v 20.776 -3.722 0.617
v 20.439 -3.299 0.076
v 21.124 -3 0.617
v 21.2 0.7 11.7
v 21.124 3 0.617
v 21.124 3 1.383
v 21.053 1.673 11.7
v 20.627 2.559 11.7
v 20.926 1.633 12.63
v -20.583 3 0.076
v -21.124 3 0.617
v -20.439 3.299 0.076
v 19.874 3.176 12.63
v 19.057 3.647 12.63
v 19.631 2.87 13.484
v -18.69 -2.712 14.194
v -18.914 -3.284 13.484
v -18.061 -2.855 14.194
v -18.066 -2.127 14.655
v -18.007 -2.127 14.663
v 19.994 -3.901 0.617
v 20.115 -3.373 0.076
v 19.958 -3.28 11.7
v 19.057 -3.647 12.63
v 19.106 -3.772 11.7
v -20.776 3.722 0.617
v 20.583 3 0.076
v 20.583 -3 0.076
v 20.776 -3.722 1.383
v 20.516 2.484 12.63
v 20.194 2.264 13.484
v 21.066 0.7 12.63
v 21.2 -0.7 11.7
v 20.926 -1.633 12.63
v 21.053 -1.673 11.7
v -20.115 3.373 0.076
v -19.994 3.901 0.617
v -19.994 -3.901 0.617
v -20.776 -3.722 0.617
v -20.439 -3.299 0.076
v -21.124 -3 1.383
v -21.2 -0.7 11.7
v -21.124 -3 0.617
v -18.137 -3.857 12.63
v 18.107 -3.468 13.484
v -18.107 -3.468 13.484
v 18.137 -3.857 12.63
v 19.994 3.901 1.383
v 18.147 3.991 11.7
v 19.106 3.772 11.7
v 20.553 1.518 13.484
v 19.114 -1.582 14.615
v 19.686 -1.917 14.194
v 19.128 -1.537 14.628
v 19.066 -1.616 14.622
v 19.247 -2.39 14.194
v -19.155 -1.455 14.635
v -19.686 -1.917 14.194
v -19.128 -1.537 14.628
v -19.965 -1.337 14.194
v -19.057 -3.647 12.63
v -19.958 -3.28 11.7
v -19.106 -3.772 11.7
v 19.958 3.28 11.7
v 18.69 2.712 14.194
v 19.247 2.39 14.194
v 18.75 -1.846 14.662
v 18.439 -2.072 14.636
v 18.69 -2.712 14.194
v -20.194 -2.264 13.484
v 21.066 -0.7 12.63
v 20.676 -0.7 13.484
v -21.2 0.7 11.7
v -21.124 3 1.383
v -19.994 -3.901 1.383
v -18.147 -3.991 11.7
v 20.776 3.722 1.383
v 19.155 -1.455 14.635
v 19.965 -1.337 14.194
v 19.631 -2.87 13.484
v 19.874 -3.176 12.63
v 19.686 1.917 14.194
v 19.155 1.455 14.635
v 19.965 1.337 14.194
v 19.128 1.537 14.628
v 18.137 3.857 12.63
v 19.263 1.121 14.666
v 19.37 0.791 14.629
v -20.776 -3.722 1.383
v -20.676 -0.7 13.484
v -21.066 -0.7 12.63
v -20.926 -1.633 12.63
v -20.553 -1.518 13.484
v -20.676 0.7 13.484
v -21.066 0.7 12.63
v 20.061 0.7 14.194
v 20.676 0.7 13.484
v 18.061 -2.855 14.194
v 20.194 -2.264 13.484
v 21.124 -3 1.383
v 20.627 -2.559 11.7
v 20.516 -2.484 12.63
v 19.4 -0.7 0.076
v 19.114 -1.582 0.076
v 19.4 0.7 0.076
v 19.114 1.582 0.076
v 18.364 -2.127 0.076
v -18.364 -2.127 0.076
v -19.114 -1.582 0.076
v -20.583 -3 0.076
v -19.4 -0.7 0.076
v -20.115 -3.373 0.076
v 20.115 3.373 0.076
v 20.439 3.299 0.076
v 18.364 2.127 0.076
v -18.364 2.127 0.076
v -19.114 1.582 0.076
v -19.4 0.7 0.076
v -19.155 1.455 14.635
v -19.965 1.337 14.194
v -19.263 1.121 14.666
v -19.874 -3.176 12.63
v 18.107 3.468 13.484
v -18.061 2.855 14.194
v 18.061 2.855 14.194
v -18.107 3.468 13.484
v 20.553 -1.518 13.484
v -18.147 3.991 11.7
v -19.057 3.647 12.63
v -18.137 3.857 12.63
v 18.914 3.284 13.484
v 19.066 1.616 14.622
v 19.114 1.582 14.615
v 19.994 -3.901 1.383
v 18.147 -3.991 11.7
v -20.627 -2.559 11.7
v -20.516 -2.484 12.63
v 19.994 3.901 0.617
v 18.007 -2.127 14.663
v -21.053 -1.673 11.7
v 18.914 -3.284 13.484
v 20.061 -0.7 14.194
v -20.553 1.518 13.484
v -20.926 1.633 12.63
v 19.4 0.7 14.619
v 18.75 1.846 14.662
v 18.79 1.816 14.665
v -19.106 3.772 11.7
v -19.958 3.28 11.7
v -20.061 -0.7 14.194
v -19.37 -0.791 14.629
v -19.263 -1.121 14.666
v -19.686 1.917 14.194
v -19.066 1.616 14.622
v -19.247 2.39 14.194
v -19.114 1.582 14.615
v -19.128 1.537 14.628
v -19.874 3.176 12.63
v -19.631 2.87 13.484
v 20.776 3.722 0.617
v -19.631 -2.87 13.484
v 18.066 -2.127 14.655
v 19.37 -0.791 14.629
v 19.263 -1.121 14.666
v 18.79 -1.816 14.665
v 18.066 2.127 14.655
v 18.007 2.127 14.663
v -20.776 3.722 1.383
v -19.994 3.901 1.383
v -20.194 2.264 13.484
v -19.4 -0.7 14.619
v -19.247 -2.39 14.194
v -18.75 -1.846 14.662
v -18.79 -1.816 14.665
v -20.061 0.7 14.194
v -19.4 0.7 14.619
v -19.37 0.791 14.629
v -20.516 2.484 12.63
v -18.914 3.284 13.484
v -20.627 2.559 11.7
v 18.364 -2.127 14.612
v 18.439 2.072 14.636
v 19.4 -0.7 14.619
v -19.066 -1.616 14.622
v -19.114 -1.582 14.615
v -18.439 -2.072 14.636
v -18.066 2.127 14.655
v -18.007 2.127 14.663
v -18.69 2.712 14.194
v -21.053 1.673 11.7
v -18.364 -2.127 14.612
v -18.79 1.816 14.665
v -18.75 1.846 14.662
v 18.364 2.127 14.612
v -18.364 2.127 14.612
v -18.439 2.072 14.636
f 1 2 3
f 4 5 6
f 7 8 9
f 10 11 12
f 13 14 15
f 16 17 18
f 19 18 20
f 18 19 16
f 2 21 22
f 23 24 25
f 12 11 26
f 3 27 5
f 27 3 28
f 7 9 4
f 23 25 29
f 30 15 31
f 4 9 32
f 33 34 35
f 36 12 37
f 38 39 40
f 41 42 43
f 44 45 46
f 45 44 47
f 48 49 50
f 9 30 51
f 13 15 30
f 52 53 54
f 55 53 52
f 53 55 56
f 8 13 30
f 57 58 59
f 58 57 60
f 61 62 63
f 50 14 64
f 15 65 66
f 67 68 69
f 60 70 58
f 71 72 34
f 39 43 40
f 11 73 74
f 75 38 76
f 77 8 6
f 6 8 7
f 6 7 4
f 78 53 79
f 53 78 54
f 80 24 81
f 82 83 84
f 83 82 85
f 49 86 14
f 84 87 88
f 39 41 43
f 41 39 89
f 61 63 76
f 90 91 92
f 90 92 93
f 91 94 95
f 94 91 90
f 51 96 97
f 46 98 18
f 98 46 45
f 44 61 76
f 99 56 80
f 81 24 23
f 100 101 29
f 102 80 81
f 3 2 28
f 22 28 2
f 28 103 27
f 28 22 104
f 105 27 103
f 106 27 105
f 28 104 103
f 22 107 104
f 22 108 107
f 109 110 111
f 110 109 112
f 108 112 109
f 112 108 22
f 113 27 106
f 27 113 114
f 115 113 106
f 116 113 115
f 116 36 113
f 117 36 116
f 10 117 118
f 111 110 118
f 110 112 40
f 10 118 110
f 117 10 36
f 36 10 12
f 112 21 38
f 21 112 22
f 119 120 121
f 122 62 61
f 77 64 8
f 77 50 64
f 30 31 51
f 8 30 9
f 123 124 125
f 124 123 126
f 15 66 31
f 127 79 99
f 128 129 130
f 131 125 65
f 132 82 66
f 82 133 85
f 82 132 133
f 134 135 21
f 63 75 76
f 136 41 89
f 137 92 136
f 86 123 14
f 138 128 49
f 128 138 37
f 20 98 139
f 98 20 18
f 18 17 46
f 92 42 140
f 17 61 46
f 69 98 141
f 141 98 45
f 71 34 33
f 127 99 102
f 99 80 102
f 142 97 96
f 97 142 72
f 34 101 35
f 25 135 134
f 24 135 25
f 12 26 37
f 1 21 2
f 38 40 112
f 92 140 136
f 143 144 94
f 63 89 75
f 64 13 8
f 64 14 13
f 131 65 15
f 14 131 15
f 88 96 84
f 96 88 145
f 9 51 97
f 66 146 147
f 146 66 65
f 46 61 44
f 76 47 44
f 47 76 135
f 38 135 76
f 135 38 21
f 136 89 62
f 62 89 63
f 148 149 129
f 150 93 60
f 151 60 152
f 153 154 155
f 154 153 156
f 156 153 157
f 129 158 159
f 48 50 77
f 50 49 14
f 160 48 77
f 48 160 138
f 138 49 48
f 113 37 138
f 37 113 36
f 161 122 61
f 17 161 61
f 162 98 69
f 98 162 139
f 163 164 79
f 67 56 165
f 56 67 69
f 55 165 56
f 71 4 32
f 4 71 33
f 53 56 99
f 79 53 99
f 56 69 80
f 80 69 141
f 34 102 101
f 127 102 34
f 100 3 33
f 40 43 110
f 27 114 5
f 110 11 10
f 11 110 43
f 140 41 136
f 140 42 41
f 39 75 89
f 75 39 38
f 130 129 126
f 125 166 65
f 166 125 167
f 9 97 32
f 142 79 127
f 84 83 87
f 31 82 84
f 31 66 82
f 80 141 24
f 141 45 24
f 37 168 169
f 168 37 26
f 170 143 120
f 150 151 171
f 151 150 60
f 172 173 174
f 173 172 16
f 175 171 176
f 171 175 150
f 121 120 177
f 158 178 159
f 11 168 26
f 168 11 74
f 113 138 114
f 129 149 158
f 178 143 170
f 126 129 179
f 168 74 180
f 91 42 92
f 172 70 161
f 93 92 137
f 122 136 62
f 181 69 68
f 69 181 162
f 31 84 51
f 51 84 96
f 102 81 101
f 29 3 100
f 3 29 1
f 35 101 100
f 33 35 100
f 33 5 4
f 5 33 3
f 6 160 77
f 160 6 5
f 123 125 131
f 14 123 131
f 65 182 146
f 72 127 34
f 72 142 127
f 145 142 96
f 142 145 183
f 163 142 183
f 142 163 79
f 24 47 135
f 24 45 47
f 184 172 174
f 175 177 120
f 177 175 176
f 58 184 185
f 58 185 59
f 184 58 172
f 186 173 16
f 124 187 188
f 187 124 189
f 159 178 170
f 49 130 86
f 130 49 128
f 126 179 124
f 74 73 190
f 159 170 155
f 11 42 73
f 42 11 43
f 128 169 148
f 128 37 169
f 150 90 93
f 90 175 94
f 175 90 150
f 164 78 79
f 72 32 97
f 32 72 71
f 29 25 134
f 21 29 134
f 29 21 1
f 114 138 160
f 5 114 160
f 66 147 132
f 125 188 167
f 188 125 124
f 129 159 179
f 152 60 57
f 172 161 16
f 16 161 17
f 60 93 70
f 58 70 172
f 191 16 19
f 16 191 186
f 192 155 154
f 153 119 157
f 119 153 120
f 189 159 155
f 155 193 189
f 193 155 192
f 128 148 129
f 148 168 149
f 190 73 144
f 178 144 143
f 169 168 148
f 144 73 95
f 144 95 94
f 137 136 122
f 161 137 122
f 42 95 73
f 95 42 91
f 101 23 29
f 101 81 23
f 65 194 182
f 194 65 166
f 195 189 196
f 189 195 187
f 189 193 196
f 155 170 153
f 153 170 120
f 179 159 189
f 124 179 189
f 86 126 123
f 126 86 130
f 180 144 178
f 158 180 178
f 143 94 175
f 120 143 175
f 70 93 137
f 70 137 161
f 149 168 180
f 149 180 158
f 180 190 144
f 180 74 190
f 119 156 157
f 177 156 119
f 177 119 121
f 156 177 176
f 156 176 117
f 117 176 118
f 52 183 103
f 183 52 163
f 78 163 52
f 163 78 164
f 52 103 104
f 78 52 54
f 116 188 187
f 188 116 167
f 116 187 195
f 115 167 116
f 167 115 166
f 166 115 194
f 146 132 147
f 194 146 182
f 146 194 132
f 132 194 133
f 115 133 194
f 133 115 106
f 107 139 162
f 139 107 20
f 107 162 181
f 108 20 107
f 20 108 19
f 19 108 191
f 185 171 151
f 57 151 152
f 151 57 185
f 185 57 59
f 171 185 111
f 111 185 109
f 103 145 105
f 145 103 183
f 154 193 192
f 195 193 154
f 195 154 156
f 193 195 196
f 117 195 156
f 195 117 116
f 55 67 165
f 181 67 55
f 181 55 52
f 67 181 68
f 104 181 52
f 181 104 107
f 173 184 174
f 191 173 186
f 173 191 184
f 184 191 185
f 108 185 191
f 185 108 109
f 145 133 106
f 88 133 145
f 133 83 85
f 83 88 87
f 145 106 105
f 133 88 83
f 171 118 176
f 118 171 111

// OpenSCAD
// -*- mode: SCAD ; c-file-style: "ellemtel" ; coding: utf-8 -*-
//
// NN
//
// © 2018–2020 Roland Sieker <ospalh@gmail.com>
// Licence: CC-BY-SA 4.0

/* [Global] */


// Set this to “render” and click on “Create Thing” when done with the setup.
preview = 1; // [0:render, 1:preview]

/* [Sizes] */

// Width of the belt
width = 38;  // [10:1:180]

// Thickness of the single belt
thickness = 1.8;  // [1:0.1:18]

// Length in belt-direction of the loop
length = 15;   // [5:05:30]

// A closed loop or one with a gap?
with_gap = false;

/* [Extra] */

// … to preview. You will get all parts as separate STLs when you click “Create Thing”.
part = "l"; // [l: Loop, o:  Outside, i: Inside, t: Test]

gap_angle = 22.5; // Overhangs much below 60° are a problem for me

/* [Hidden] */

// Done with the customizer

// *******************************************************
// Extra parameters. These can be changed reasonably safely.


w = 1.8;  // Wall width
p = 1.2;  // Bottom, top plate hight
c = 0.4;  // Clearance
r_rb = 1;  // Rounding radius, bottom
r_rm = 1.5; // Rounding radis, main
angle = 60; // Overhangs much below 60° are a problem for me

// *******************************************************
// Some shortcuts. These shouldn’t be changed


module kmirror(maxis=[1, 0, 0])
{
   // Keep *and* mirror an object. Standard is left and right mirroring.
   children();
   mirror(maxis)
   {
      children();
   }
}

tau = 2 * PI;  // π is still wrong. τ = circumference / r

xy_factor = 1/tan(angle);
// To get from a hight to a horizontal width inclined correctly
z_factor = tan(angle);  // The other way around


some_distance = 50;
ms = 0.01;  // Muggeseggele.

// fn for differently sized objects and fs, fa; all for preview or rendering.
pna = 40;
pnb = 15;
pa = 5;
ps = 1;
rna = 180;
rnb = 30;
ra = 2;
rs = 0.25;
function na() = (preview) ? pna : rna;
function nb() = (preview) ? pnb : rnb;
$fs = (preview) ? ps : rs;
$fa = (preview) ? pa : ra;

// *******************************************************
// End setup



// *******************************************************
// Generate the parts

print_part();


if ("t" == part)
{
   loop();
}

if ("o" == part)
{
   outer_loop();
}


if ("i" == part)
{
   hole();
}

module print_part()
{
   if ("l" == part)
   {
      loop();
   }
}

// *******************************************************
// Code for the parts themselves


module loop()
{

   difference()
   {
      outer_loop();
      hole();
   }
}


module outer_loop()
{
   hull()
   {
      kmirror()
      {
         kmirror([0, 1, 0])
         {
            translate([width/2+c-r_rm, thickness+c-r_rm, length-r_rm-w])
            {
               sphere(r=r_rm+w);
            }
            translate([width/2+c+w-r_rb, thickness+c+w-r_rb, r_rb])
            {
               sphere(r=r_rb);
            }
         }
      }
   }
}


module hole()
{
   hull()
   {
      kmirror()
      {
         kmirror([0, 1, 0])
         {
            translate([width/2+c-r_rm, thickness+c-r_rm, -ms])
            {
               cylinder(r=r_rm, h=length+2*ms);
            }
         }
      }
   }
   if (with_gap)
   {
      translate([0, 0, 0.5*length])
      rotate([0,gap_angle,0])
      {
         translate([-thickness/2-c, 0, -2.5*length])
         {
            cube([thickness+2*c, 2*(width+w+c),6*length]);
         }
      }
   }
}
